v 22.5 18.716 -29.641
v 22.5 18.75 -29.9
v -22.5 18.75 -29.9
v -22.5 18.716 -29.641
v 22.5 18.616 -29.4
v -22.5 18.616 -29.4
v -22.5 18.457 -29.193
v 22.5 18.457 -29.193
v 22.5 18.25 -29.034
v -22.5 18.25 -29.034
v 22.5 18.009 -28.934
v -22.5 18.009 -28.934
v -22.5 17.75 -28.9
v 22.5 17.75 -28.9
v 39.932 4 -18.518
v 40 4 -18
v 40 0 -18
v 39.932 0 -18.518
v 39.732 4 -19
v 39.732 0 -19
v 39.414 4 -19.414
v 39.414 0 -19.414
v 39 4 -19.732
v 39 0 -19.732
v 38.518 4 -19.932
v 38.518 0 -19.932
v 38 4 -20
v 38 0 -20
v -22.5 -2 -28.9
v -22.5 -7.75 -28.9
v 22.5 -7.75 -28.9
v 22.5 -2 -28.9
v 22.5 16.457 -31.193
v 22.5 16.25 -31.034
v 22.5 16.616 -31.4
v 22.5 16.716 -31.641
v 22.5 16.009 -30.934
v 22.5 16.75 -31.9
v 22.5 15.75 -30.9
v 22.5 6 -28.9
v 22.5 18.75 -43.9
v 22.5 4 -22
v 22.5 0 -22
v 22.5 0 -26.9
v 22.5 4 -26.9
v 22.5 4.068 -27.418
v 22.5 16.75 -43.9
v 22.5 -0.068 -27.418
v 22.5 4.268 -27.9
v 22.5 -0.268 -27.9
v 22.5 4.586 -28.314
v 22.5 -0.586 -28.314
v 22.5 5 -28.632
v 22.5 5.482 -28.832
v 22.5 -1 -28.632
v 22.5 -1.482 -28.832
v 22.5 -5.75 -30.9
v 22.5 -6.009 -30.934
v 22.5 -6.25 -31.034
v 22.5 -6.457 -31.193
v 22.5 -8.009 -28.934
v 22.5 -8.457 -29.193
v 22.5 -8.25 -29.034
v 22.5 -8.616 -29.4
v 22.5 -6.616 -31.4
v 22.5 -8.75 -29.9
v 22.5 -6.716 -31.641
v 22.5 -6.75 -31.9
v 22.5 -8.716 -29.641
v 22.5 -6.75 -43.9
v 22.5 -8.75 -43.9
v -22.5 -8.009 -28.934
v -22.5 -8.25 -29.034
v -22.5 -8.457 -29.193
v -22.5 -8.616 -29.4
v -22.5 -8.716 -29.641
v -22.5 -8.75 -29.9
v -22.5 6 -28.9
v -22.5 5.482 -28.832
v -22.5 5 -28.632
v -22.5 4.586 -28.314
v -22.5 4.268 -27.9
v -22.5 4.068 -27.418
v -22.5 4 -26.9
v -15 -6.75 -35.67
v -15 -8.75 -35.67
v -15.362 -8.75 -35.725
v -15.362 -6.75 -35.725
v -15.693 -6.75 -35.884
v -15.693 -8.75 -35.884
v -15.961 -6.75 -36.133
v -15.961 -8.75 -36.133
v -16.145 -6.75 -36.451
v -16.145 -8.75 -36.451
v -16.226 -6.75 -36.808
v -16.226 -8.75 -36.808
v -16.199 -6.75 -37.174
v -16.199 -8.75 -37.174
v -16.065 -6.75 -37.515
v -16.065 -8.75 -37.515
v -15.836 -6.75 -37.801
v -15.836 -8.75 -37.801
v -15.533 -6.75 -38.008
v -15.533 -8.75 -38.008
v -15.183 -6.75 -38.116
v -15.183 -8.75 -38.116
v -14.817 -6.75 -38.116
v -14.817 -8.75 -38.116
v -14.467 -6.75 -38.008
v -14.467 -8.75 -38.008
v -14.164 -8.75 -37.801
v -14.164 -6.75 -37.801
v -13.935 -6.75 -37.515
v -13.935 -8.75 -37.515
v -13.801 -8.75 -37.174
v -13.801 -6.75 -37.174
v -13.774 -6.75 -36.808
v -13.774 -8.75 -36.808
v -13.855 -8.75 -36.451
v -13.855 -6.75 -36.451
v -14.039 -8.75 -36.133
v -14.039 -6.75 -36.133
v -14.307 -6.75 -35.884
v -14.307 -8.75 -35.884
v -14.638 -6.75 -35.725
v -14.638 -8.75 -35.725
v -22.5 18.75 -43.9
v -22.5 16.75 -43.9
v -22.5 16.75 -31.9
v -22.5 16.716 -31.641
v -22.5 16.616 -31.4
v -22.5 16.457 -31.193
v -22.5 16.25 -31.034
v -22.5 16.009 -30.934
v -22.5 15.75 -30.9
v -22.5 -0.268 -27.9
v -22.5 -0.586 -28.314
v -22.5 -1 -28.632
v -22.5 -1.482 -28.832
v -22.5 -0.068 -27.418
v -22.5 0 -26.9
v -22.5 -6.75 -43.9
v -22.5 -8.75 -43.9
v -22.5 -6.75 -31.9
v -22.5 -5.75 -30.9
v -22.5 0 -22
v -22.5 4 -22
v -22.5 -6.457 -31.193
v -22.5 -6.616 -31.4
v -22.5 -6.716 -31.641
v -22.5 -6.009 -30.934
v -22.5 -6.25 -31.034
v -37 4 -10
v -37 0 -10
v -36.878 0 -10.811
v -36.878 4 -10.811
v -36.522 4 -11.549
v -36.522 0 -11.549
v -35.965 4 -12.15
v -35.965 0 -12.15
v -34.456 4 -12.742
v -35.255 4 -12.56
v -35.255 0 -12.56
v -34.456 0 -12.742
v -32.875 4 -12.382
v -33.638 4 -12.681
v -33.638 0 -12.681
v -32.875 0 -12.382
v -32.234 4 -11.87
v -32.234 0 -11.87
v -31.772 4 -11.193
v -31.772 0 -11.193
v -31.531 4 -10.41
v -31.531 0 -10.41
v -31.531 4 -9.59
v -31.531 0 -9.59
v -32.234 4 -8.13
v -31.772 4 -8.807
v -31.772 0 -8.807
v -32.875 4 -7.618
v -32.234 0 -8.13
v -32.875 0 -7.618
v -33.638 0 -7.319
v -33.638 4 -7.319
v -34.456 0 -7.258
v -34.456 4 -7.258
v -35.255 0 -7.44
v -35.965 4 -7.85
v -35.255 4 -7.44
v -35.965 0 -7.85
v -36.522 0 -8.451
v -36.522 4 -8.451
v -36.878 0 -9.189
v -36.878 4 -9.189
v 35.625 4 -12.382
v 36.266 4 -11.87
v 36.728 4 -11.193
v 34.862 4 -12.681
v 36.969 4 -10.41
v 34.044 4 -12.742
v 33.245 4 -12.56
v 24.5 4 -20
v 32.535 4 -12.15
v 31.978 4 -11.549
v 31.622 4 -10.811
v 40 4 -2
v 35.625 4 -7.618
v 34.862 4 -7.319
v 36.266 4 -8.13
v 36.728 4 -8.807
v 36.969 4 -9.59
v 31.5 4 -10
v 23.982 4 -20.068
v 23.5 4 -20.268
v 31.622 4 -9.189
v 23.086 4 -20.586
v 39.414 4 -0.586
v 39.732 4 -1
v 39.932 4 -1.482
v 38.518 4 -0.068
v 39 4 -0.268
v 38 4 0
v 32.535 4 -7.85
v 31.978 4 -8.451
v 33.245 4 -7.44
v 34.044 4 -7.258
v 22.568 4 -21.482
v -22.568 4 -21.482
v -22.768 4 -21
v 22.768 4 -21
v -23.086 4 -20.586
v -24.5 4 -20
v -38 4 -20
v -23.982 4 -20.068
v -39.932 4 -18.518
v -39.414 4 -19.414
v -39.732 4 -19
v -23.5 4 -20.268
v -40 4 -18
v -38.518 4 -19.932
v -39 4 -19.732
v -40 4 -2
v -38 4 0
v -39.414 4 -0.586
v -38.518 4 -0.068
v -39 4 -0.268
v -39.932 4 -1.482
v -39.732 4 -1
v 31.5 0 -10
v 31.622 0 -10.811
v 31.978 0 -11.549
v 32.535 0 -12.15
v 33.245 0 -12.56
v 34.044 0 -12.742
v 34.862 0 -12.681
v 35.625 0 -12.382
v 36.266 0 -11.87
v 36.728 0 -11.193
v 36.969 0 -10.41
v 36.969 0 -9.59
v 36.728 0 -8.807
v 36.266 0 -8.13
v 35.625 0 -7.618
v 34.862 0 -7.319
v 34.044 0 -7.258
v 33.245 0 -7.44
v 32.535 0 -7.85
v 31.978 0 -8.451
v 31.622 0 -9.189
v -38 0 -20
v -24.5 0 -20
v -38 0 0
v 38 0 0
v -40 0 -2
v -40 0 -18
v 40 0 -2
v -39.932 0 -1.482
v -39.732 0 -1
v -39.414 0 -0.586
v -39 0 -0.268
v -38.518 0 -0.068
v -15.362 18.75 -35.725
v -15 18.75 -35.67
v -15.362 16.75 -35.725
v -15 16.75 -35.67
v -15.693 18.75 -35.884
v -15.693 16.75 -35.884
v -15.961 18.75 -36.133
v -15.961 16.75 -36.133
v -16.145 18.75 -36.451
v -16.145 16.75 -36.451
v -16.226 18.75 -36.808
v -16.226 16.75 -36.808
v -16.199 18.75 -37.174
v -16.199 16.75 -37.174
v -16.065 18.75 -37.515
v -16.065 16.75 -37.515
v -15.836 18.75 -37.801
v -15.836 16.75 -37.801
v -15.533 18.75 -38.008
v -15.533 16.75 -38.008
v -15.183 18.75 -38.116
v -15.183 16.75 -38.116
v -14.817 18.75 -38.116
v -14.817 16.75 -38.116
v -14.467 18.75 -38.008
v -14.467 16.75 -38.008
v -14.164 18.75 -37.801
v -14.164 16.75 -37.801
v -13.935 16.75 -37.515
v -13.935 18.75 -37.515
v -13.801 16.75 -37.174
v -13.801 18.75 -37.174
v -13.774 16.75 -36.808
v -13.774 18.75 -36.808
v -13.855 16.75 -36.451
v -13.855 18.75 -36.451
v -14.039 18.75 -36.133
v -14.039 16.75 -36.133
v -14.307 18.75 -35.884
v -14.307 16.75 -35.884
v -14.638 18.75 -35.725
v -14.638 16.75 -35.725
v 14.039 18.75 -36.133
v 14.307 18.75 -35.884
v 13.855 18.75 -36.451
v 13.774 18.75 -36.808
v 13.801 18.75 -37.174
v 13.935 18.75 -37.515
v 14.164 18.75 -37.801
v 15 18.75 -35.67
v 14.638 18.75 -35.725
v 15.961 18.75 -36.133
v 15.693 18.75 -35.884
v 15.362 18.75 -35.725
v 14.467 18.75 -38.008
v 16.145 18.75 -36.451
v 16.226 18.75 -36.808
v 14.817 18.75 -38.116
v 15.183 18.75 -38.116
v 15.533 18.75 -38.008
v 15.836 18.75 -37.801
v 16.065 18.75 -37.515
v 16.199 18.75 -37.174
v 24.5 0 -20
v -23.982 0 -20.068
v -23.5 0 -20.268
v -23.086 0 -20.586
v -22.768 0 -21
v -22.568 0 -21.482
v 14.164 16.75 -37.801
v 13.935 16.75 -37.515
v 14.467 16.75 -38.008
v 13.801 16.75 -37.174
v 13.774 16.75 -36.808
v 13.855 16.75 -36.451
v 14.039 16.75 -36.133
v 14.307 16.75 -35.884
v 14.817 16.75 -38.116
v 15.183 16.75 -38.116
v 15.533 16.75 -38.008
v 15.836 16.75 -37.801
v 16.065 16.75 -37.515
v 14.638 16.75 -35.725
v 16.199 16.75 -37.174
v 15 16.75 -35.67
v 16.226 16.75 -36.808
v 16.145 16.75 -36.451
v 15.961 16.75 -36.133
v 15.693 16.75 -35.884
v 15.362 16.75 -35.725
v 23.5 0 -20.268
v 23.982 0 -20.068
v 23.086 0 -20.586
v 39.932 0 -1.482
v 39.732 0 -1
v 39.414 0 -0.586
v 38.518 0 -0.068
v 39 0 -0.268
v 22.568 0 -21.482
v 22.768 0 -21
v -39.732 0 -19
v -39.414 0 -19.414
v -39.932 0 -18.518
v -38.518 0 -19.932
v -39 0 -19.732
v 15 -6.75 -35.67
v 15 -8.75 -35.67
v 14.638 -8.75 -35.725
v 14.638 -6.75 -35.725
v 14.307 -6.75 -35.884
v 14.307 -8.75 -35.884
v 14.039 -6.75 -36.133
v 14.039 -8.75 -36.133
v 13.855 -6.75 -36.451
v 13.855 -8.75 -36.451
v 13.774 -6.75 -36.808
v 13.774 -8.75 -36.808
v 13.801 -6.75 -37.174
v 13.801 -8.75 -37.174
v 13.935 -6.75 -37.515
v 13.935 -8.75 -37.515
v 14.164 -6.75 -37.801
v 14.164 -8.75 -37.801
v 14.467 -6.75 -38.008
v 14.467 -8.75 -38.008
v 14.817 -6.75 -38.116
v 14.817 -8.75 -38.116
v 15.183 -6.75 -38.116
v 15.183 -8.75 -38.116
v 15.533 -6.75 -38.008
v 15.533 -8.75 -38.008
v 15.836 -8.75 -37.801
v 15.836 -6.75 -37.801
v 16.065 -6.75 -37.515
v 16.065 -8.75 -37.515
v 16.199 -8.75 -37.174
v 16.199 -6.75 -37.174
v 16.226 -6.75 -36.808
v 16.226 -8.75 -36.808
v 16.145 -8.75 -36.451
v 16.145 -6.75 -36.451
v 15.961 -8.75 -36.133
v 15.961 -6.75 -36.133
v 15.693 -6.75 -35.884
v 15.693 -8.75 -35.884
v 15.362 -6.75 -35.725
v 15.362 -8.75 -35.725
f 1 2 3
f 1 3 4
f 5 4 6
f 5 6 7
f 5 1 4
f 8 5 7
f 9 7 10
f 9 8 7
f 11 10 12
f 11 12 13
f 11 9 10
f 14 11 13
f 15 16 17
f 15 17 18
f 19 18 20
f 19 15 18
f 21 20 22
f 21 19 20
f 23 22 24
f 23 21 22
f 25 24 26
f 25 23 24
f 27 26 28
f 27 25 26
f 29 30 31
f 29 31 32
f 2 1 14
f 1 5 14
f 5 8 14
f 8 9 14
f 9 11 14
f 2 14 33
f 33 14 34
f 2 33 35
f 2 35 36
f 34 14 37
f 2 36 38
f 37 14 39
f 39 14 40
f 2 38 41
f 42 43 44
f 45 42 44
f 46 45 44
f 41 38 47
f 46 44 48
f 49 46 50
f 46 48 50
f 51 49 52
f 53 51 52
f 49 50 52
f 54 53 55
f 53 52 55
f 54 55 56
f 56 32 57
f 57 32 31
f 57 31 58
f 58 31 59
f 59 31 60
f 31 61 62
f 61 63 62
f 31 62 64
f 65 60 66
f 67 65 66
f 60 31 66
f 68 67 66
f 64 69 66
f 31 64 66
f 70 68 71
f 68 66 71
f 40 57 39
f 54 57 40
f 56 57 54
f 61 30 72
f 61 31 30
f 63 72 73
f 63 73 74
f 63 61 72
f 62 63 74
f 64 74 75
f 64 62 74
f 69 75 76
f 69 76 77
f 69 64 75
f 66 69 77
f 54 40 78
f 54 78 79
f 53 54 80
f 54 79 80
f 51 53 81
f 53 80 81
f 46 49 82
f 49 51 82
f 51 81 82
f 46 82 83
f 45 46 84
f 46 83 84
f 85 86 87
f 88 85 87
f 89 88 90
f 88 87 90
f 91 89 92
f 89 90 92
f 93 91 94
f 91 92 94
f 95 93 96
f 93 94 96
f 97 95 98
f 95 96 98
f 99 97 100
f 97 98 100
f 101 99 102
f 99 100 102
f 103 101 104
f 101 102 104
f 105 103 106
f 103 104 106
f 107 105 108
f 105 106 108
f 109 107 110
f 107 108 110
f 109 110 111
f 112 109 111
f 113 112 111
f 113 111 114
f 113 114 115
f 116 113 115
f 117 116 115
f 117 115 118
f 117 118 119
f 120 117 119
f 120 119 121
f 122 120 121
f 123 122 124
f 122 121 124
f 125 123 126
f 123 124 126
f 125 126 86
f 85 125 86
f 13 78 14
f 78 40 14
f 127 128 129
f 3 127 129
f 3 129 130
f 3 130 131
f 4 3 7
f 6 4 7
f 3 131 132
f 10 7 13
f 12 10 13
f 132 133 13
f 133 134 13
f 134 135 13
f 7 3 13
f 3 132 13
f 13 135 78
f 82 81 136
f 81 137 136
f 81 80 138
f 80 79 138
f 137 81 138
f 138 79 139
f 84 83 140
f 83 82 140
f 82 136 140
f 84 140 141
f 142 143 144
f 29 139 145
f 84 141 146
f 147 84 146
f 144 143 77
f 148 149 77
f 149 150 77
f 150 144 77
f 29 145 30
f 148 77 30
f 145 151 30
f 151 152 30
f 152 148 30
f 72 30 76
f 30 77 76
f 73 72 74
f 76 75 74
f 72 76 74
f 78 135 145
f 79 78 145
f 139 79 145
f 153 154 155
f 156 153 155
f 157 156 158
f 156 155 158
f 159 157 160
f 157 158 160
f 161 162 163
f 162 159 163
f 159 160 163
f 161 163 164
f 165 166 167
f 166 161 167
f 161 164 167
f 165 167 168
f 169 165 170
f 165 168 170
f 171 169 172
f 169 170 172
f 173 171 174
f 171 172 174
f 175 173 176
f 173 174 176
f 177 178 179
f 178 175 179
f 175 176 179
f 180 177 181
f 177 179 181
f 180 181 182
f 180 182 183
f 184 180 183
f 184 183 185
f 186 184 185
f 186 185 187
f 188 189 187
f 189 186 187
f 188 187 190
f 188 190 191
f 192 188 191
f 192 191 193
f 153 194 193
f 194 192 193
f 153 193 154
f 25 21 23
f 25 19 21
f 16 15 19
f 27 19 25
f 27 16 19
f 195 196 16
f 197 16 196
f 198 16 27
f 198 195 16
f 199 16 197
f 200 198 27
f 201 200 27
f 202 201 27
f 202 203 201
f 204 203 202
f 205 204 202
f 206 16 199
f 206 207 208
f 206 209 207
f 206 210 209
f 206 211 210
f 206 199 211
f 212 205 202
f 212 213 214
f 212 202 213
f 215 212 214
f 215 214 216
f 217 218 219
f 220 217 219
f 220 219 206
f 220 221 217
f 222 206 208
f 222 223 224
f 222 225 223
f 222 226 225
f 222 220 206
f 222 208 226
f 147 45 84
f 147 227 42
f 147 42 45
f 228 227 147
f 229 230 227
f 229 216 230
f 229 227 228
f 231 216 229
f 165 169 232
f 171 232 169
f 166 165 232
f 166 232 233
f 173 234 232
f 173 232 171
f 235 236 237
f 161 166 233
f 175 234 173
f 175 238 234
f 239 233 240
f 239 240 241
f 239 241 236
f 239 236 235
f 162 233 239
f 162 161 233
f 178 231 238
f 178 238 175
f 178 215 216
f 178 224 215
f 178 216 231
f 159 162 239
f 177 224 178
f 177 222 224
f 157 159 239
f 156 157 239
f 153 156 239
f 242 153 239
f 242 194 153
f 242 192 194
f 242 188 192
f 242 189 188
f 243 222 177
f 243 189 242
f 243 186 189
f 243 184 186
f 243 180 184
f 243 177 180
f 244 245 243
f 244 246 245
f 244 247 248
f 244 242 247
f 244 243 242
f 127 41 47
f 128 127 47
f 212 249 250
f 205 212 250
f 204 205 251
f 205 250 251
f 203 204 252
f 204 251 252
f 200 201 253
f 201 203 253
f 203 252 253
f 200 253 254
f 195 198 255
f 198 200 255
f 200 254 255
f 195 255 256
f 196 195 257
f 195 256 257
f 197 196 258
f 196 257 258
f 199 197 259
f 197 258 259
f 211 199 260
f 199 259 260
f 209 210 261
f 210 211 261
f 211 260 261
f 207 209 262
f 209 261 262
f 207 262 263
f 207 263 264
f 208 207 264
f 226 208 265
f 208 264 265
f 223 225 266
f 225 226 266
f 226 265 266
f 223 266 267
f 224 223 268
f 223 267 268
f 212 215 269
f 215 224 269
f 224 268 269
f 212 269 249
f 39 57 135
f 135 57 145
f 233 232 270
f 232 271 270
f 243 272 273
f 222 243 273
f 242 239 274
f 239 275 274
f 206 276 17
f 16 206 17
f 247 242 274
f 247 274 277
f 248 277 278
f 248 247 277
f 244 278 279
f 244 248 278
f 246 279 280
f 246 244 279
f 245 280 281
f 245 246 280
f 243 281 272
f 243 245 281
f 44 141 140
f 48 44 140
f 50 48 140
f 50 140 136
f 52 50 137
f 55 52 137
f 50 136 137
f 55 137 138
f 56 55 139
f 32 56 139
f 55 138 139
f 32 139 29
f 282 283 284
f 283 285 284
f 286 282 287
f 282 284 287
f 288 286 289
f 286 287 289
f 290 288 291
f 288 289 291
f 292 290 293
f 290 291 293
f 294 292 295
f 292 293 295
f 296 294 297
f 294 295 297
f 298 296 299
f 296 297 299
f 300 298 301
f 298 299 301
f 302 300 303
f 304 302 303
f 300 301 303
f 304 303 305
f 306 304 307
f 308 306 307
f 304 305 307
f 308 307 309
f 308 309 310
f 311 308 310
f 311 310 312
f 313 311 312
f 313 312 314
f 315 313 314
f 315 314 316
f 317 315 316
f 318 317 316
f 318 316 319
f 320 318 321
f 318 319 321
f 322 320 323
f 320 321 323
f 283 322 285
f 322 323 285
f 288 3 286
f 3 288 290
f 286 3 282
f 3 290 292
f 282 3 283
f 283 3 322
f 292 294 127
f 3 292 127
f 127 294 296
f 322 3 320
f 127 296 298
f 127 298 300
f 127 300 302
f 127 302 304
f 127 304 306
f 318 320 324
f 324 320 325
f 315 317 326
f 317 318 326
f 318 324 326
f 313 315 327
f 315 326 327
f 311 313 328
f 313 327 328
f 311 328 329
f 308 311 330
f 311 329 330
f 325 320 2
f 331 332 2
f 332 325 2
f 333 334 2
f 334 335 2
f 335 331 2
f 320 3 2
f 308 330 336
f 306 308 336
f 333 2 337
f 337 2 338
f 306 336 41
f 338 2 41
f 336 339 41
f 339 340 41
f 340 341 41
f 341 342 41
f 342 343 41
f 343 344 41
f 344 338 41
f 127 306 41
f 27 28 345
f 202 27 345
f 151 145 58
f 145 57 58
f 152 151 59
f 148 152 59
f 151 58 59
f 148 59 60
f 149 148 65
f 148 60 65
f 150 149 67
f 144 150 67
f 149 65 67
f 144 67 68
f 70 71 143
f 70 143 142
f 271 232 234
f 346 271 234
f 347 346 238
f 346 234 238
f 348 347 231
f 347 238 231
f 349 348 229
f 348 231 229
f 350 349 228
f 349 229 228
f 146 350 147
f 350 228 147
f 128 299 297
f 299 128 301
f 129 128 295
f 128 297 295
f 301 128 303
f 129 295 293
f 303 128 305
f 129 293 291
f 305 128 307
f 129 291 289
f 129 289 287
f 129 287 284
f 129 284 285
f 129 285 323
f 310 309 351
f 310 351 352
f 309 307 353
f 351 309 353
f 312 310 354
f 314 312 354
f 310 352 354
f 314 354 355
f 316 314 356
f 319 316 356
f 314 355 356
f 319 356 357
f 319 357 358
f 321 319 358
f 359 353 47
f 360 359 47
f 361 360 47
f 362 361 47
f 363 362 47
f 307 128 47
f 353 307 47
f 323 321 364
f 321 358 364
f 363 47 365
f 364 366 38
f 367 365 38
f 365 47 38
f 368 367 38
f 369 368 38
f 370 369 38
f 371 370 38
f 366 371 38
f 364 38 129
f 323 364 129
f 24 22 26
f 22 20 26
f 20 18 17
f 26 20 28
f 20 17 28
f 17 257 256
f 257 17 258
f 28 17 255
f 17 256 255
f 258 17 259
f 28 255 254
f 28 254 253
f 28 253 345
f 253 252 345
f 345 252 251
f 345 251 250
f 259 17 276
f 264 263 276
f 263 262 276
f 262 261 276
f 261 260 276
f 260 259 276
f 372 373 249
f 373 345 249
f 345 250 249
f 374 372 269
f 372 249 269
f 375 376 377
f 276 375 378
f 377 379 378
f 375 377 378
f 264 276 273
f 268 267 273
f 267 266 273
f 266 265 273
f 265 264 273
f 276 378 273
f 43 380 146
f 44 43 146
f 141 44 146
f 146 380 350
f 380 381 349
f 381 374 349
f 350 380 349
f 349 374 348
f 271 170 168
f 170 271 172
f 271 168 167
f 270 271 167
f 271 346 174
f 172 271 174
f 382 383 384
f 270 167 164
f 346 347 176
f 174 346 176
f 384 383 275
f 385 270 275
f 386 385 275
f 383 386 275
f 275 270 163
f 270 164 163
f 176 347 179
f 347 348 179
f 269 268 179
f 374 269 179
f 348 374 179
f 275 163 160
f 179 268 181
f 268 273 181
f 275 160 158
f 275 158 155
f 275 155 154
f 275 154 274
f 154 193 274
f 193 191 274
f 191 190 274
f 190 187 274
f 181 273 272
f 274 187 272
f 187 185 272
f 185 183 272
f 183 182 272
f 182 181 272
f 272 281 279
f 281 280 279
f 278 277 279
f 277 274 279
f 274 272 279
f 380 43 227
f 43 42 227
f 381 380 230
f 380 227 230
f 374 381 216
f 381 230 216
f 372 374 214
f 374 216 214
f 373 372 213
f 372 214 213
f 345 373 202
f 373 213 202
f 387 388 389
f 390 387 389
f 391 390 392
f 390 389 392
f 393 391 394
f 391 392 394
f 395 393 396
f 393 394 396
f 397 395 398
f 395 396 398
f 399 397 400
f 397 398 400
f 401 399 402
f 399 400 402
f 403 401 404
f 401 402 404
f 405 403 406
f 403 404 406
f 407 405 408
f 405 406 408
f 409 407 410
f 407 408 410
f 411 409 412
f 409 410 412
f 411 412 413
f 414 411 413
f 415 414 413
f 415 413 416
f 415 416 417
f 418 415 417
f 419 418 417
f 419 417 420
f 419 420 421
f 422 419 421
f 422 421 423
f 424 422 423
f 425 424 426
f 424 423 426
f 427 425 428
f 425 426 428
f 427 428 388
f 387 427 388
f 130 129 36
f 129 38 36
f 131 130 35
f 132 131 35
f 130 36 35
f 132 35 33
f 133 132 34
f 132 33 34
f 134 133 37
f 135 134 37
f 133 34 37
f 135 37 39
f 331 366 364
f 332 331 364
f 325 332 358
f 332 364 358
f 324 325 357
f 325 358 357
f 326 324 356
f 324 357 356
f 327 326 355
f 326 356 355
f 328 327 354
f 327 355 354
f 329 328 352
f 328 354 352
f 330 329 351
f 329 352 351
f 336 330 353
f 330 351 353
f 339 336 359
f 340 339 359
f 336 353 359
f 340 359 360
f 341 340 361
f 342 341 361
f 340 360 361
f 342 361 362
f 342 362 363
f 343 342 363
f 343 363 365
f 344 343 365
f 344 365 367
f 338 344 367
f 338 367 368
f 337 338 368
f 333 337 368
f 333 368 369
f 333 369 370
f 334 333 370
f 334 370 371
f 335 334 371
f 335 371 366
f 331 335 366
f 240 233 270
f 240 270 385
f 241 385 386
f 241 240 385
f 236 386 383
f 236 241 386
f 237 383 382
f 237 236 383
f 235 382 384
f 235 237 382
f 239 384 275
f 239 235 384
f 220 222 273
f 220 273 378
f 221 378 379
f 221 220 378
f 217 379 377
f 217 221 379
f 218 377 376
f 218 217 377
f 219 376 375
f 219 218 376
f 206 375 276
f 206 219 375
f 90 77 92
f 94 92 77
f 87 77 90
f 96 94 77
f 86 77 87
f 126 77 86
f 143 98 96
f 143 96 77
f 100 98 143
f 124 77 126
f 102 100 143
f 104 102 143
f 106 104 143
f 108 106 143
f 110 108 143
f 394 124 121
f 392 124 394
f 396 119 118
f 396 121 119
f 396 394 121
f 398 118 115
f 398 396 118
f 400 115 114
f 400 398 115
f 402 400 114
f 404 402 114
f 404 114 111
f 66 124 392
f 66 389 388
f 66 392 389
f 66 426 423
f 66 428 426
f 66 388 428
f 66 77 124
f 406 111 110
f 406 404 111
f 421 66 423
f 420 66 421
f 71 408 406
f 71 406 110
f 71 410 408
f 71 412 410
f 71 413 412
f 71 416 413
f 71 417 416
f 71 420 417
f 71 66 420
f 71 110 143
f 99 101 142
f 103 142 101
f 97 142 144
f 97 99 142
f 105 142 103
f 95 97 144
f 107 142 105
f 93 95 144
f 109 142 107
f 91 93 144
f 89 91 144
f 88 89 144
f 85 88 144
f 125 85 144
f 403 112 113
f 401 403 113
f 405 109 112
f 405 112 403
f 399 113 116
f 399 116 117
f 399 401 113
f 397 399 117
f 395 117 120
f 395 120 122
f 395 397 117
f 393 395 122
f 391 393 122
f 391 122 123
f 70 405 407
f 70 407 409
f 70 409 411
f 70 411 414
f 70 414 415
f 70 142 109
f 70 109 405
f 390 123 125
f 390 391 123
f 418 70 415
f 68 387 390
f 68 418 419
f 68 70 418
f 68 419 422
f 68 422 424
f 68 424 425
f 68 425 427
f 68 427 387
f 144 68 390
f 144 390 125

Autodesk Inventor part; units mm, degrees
ref_plane "YZ Plane" through (0, 0, 0) normal (1, 0, 0) x (0, 1, 0)
ref_plane "XZ Plane" through (0, 0, 0) normal (0, 1, 0) x (-1, 0, 0)
ref_plane "XY Plane" through (0, 0, 0) normal (0, 0, 1) x (1, 0, 0)
sketch "Sketch2" plane through (0, 0, 0) normal (0, 1, 0) x (-1, 0, 0)
  line L0 (22.5, -20) -> (-22.5, -20)
  line L1 (-22.5, -20) -> (-22.5, -30.9)
  line L2 (-22.5, -30.9) -> (22.5, -30.9)
  line L3 (22.5, -30.9) -> (22.5, -20)
  line L4 (0, -37.08) -> (0, 6.18) construction
  line L5 (40, 0) -> (-40, 0)
  line L6 (-40, 0) -> (-40, -20)
  line L7 (-40, -20) -> (40, -20)
  line L8 (40, -20) -> (40, 0)
  circle A0 centre (34.25, -10) radius 2.75
  circle A1 centre (-34.25, -10) radius 2.75
  point P0 (0, 0)
  point P1 (0, -20)
  point P2 (-22.5, -20)
  dimension "d0" = 45
  dimension "d1" = 22.5
  dimension "d2" = 10.9
  dimension "d3" = 5.5
  dimension "d4" = 68.5
  dimension "d5" = 34.25
  dimension "d6" = 40
  dimension "d7" = 40
  dimension "d8" = 20
  dimension "d9" = 10
  dimension "d10" = 5.5
  dimension "d11" = 10
extrude "Extrusion1" add sketch "Sketch2" along normal blind 4
sketch "Sketch3" plane through (22.5, 0, -20) normal (1, 0, 0) x (0, 0, -1)
  line L0 (0, 0) -> (10.9, 0) construction
  line L1 (10.9, 0) -> (10.9, 4) construction
  line L2 (0, 4) -> (10.9, 4) construction
  line L3 (0, 0) -> (0, 4) construction
  line L4 (10.9, 4) -> (8.9, 4)
  line L5 (8.9, 4) -> (8.9, 17.75)
  line L6 (9.9, 18.75) -> (10.9, 18.75)
  line L7 (10.9, 15.75) -> (10.9, 4)
  line L8 (10.9, 18.75) -> (23.9, 18.75)
  line L9 (23.9, 18.75) -> (23.9, 16.75)
  line L10 (23.9, 16.75) -> (11.9, 16.75)
  line L11 (8.9, 0) -> (10.9, 0)
  line L12 (10.9, 0) -> (10.9, -5.75)
  line L13 (10.9, -8.75) -> (9.9, -8.75)
  line L14 (8.9, -7.75) -> (8.9, 0)
  line L15 (10.9, -8.75) -> (23.9, -8.75)
  line L16 (23.9, -8.75) -> (23.9, -6.75)
  line L17 (23.9, -6.75) -> (11.9, -6.75)
  arc A0 (11.9, 16.75) -> (10.9, 15.75) centre (11.9, 15.75) ccw
  arc A1 (9.9, 18.75) -> (8.9, 17.75) centre (9.9, 17.75) ccw
  arc A2 (8.9, -7.75) -> (9.9, -8.75) centre (9.9, -7.75) ccw
  arc A3 (10.9, -5.75) -> (11.9, -6.75) centre (11.9, -5.75) ccw
  point P0 (-20, 0)
  dimension "d14" = 6.75
  dimension "d15" = 12.75
  dimension "d16" = 2
  dimension "d17" = 2
  dimension "d18" = 2
  dimension "d19" = 13
  dimension "d20" = 1
  dimension "d21" = 15
extrude "Extrusion2" add sketch "Sketch3" against normal up to surface (45 mm away)
fillet "Fillet1" radius 2 2 edges at (0, 0, -28.9) (0, 4, -28.9)
sketch "Sketch4" plane through (22.5, 18.75, -29.9) normal (0, 1, 0) x (1, 0, 0)
  line L0 (-45, 14) -> (-45, 0) construction
  line L1 (0, 0) -> (-45, 0) construction
  line L2 (0, 14) -> (0, 0) construction
  line L3 (0, 14) -> (-45, 14) construction
  line L4 (-22.5, 26.78) -> (-22.5, -62.68) construction
  point P0 (-22.5, -29.9)
  point P1 (-37.5, 7)
  point P2 (-7.5, 7)
  dimension "d25" = 15
  dimension "d26" = 15
  dimension "d27" = 7
  dimension "d28" = 7
hole "Hole1" at (15, 18.75, -36.9) at (-15, 18.75, -36.9) direction (0, -1, 0) diameter 2.459 depth 27.5 thread size "M3x0.5" class "6H" standard "ISO Metric profile"
fillet "Fillet2" radius 2 6 edges at (22.5, 2, -20) (40, 2, -20) (40, 2, 0) (-40, 2, 0) (-40, 2, -20) (-22.5, 2, -20)
equation "\"d5\" = 0.5 * d4"
equation "\"d9\" = 0.5 * d8"
properties part number "P047_BoitierCouvercleV4_porteLidar"
